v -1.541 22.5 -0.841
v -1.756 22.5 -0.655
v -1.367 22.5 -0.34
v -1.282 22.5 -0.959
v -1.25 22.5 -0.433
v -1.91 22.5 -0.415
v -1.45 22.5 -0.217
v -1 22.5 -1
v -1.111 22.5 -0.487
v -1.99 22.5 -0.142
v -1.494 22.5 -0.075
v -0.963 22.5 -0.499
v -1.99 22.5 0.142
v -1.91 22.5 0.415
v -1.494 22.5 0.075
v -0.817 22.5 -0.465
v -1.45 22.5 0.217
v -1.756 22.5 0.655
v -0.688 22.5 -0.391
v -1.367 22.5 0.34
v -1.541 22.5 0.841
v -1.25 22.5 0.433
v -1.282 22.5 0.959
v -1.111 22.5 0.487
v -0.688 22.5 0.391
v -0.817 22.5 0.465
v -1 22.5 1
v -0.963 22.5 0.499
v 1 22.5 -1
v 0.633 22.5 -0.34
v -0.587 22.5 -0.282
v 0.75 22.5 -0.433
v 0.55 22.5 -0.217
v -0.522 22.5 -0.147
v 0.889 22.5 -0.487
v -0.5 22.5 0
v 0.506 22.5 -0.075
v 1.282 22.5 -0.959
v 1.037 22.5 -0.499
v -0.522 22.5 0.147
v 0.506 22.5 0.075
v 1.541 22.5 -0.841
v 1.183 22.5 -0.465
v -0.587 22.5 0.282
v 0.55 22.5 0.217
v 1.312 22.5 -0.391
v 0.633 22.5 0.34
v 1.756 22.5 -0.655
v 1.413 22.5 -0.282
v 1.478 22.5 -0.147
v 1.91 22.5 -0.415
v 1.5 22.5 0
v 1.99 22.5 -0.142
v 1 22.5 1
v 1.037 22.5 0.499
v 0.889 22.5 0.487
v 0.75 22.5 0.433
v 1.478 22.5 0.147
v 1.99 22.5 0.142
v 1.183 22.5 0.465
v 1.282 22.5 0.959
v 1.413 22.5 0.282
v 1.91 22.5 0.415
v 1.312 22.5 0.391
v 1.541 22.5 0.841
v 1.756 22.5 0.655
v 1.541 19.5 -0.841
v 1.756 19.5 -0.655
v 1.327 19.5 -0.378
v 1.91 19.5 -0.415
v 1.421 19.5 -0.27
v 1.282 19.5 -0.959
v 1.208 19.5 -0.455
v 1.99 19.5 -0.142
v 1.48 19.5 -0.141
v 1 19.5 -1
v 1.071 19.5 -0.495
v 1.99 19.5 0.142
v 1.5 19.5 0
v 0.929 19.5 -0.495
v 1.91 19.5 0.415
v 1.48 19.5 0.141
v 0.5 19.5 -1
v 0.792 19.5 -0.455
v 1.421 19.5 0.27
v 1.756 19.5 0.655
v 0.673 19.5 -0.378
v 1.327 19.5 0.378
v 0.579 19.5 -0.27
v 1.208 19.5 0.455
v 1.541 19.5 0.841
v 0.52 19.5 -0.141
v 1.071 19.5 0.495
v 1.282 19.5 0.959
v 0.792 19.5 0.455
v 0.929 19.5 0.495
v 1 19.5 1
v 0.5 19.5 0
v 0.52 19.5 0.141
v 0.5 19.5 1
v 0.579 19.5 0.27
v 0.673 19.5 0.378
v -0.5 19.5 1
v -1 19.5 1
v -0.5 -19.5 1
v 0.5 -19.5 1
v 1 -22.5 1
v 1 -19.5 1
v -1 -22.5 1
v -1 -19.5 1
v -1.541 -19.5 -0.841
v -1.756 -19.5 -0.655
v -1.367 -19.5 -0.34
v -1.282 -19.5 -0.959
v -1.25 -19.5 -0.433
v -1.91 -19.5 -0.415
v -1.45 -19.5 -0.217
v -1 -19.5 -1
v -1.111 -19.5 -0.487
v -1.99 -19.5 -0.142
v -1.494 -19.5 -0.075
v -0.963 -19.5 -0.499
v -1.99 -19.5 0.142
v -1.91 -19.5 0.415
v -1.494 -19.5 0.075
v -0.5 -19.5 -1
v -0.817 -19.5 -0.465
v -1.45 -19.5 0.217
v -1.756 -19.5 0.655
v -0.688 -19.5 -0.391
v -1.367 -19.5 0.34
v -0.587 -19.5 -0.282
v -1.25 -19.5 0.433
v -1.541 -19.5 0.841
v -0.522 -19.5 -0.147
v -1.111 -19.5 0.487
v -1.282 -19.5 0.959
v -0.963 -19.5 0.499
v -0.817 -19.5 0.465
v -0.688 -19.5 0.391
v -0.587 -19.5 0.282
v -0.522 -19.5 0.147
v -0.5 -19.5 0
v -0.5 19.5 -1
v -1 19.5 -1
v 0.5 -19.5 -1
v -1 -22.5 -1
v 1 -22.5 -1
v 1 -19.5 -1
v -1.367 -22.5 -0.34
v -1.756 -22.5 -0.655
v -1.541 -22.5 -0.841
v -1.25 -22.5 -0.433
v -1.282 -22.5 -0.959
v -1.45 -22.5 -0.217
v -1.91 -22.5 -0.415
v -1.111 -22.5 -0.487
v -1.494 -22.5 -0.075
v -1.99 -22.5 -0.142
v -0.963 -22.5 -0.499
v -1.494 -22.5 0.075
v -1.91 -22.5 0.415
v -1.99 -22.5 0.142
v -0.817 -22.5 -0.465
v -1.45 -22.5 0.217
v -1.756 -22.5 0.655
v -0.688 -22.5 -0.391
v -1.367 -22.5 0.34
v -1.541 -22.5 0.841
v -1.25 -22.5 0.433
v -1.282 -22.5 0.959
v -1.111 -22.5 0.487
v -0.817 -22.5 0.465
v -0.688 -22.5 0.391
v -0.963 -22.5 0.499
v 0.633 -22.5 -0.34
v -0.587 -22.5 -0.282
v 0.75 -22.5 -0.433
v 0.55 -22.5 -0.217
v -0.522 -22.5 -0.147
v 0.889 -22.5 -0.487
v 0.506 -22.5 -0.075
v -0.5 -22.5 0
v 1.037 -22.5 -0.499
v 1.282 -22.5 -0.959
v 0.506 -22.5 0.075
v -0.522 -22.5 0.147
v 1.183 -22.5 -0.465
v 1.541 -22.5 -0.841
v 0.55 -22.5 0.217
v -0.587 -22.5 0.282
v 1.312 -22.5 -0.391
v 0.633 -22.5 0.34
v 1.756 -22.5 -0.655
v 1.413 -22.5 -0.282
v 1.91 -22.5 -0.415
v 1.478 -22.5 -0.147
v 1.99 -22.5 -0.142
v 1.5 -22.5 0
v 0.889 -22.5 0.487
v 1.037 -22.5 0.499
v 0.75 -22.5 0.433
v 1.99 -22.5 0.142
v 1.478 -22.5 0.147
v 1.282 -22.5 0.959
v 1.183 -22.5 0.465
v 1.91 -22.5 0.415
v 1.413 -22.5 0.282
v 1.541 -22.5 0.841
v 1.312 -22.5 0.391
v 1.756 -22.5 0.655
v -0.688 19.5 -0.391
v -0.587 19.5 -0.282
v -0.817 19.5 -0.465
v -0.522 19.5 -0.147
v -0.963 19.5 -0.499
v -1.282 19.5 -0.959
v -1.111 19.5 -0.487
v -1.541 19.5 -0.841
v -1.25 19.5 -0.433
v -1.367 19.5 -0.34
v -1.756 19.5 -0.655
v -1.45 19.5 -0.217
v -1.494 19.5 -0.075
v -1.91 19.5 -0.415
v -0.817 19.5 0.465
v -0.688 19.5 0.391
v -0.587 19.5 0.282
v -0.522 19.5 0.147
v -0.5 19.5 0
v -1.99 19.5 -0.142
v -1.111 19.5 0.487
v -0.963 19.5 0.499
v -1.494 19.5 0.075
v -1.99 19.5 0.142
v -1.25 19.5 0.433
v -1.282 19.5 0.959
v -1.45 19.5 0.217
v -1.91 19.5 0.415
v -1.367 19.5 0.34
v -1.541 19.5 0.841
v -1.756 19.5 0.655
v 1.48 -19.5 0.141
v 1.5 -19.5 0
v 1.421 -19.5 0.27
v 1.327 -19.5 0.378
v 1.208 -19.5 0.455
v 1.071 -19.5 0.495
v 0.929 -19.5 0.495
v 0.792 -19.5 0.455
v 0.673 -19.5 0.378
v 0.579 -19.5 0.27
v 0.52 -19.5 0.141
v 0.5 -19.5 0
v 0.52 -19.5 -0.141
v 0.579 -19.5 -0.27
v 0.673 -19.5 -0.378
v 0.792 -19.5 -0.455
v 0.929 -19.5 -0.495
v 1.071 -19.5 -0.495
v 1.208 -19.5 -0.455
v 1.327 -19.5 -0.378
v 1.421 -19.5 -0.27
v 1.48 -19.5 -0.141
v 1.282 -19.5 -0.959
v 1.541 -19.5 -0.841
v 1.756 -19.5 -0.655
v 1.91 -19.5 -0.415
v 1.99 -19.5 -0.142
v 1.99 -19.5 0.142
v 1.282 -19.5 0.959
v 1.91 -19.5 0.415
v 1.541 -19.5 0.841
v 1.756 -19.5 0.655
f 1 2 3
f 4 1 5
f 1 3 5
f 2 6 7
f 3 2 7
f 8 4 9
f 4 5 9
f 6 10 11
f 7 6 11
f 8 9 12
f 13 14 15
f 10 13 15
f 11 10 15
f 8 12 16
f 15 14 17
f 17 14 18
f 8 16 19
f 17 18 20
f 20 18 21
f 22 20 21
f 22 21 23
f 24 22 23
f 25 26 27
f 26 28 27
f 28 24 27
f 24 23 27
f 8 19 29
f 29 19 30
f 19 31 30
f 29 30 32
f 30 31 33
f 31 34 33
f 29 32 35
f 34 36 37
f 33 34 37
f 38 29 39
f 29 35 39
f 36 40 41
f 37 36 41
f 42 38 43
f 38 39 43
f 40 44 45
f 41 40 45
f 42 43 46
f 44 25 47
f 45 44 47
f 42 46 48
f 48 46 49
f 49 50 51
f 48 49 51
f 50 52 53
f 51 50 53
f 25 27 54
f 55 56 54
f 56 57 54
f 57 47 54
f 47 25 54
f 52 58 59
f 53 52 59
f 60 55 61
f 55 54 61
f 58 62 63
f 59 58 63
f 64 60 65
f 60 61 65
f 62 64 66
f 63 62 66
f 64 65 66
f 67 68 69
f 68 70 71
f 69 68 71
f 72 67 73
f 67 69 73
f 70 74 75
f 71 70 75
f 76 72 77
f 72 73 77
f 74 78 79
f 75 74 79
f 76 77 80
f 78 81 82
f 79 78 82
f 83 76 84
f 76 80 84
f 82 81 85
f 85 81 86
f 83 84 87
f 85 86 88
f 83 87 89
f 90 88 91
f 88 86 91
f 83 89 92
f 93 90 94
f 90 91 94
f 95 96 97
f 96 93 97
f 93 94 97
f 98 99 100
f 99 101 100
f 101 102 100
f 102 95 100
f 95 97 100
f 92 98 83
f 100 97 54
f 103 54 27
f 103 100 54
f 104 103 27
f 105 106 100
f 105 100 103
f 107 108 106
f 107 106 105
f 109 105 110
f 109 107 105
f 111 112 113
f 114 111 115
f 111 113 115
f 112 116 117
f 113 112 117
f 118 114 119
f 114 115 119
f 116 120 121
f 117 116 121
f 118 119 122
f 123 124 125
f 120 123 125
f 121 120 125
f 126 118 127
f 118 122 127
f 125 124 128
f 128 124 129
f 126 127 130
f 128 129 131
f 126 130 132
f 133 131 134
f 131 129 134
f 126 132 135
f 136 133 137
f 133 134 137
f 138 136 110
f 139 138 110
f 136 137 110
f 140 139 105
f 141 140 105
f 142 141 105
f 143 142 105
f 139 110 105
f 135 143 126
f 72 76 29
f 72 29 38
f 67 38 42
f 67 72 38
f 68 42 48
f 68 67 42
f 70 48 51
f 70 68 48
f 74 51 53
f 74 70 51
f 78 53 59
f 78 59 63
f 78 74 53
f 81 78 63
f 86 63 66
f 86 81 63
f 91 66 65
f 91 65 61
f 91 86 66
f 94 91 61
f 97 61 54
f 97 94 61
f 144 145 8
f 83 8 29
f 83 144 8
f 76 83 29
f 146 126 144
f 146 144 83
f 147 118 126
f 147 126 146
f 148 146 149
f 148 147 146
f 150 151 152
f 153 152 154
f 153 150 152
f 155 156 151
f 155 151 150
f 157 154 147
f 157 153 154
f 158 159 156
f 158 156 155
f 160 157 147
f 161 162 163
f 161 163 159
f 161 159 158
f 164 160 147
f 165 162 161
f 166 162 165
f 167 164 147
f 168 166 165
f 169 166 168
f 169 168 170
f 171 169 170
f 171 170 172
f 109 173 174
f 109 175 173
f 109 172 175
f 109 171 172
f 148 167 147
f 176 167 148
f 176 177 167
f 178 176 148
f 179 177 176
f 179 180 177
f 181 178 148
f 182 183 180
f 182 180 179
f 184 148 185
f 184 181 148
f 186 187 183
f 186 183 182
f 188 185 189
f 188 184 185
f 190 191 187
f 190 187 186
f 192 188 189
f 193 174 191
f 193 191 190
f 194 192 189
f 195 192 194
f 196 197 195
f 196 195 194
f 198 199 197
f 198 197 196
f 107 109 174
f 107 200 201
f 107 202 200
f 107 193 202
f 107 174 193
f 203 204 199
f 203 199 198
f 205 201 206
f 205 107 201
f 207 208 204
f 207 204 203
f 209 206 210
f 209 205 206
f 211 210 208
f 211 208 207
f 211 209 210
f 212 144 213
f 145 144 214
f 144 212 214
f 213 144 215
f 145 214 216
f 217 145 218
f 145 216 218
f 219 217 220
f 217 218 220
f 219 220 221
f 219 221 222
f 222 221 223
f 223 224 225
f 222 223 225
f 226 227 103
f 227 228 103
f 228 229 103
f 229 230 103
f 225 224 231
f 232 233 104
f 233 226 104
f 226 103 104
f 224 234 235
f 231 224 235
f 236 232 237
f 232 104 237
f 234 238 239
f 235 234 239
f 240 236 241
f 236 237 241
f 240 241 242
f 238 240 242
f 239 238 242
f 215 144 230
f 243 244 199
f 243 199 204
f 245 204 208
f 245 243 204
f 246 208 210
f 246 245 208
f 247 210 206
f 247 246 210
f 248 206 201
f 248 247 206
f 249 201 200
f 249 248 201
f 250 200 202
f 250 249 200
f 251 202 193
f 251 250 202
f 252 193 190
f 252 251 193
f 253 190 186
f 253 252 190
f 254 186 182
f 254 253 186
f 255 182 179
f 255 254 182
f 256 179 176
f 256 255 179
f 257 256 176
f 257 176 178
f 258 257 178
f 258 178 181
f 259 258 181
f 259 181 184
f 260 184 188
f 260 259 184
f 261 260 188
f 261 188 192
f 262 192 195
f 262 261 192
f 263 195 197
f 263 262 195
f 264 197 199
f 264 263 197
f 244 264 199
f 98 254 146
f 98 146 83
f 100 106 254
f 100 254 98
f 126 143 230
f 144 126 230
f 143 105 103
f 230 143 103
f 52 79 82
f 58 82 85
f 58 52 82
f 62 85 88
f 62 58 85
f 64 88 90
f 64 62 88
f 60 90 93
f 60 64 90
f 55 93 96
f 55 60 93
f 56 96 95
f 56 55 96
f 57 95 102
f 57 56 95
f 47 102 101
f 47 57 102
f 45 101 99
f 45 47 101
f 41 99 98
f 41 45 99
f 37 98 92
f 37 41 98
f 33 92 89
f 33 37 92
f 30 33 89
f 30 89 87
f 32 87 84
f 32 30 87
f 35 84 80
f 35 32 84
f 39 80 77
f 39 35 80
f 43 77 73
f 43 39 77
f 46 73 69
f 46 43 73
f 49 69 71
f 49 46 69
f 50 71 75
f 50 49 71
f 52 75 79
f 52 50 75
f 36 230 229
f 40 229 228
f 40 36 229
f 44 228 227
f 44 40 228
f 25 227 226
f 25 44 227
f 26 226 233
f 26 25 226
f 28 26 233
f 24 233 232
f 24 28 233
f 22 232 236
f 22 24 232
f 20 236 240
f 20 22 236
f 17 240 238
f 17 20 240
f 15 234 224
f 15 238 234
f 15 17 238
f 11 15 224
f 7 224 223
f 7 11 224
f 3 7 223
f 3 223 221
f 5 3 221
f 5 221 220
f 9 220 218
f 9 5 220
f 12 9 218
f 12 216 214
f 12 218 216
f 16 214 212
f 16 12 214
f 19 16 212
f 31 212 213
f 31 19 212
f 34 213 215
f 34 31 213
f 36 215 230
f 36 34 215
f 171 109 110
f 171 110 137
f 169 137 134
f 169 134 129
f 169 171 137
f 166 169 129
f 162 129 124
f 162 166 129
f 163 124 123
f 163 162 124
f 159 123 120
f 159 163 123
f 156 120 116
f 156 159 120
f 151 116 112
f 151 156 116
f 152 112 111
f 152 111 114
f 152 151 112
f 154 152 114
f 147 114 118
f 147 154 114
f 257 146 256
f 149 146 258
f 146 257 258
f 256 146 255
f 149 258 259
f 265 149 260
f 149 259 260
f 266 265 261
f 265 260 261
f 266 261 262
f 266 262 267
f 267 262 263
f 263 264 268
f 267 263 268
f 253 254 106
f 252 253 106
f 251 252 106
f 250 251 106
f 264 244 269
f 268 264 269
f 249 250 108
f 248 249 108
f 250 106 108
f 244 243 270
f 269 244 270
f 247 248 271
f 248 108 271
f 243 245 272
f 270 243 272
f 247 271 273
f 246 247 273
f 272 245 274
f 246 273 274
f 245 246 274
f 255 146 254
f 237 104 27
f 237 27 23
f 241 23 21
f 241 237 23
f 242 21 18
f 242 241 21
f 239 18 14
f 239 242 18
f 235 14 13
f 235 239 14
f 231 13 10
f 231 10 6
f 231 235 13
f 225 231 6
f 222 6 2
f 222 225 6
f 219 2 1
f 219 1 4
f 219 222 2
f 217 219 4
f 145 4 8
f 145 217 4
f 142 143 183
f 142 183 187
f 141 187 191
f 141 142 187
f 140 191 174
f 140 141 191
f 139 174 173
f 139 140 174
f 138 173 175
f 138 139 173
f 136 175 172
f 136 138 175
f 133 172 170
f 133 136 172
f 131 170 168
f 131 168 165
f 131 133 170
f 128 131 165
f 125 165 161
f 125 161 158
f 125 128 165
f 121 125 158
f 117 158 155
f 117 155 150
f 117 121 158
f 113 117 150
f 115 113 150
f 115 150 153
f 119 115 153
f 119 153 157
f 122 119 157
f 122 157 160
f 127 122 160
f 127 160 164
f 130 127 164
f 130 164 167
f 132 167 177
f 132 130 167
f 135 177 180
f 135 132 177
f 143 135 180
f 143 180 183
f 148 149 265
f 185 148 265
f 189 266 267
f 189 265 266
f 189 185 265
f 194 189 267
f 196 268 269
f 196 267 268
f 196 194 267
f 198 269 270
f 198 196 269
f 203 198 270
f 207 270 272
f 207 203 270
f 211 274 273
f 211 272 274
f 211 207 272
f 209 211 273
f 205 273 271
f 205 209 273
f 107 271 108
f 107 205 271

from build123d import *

# Parameters (mm, degrees)
F0_R     = 0.5
F1_DEPTH = 22.5
F2_W     = 1
F2_H     = 39
F2_W_2   = 0.5
F3_DEPTH = 25


with BuildPart() as f1:
    # F0 (on Front) → F1 (new body, symmetric)
    with BuildSketch(Plane.XZ):
        with BuildLine():
            ThreePointArc((-1, 1), (-2, 0), (-1, -1))
            Line((-1, -1), (1, -1))
            ThreePointArc((1, -1), (2, 0), (1, 1))
            Line((1, 1), (-1, 1))
        make_face()
        with Locations((-1, 0)):
            Circle(F0_R, mode=Mode.SUBTRACT)
        with Locations((1, 0)):
            Circle(F0_R, mode=Mode.SUBTRACT)
    extrude(amount=F1_DEPTH, both=True)

    # F2 (on face) → F3 (cut)
    with BuildSketch(Plane.XY.offset(1)):
        with Locations((1.5, 0)):
            Rectangle(F2_W, F2_H)
        with Locations((0.75, 0)):
            Rectangle(F2_W_2, F2_H)
        with Locations((-1.5, 0)):
            Rectangle(F2_W, F2_H)
        with Locations((-0.75, 0)):
            Rectangle(F2_W_2, F2_H)
    extrude(amount=-F3_DEPTH, mode=Mode.SUBTRACT)


solid = f1.part
